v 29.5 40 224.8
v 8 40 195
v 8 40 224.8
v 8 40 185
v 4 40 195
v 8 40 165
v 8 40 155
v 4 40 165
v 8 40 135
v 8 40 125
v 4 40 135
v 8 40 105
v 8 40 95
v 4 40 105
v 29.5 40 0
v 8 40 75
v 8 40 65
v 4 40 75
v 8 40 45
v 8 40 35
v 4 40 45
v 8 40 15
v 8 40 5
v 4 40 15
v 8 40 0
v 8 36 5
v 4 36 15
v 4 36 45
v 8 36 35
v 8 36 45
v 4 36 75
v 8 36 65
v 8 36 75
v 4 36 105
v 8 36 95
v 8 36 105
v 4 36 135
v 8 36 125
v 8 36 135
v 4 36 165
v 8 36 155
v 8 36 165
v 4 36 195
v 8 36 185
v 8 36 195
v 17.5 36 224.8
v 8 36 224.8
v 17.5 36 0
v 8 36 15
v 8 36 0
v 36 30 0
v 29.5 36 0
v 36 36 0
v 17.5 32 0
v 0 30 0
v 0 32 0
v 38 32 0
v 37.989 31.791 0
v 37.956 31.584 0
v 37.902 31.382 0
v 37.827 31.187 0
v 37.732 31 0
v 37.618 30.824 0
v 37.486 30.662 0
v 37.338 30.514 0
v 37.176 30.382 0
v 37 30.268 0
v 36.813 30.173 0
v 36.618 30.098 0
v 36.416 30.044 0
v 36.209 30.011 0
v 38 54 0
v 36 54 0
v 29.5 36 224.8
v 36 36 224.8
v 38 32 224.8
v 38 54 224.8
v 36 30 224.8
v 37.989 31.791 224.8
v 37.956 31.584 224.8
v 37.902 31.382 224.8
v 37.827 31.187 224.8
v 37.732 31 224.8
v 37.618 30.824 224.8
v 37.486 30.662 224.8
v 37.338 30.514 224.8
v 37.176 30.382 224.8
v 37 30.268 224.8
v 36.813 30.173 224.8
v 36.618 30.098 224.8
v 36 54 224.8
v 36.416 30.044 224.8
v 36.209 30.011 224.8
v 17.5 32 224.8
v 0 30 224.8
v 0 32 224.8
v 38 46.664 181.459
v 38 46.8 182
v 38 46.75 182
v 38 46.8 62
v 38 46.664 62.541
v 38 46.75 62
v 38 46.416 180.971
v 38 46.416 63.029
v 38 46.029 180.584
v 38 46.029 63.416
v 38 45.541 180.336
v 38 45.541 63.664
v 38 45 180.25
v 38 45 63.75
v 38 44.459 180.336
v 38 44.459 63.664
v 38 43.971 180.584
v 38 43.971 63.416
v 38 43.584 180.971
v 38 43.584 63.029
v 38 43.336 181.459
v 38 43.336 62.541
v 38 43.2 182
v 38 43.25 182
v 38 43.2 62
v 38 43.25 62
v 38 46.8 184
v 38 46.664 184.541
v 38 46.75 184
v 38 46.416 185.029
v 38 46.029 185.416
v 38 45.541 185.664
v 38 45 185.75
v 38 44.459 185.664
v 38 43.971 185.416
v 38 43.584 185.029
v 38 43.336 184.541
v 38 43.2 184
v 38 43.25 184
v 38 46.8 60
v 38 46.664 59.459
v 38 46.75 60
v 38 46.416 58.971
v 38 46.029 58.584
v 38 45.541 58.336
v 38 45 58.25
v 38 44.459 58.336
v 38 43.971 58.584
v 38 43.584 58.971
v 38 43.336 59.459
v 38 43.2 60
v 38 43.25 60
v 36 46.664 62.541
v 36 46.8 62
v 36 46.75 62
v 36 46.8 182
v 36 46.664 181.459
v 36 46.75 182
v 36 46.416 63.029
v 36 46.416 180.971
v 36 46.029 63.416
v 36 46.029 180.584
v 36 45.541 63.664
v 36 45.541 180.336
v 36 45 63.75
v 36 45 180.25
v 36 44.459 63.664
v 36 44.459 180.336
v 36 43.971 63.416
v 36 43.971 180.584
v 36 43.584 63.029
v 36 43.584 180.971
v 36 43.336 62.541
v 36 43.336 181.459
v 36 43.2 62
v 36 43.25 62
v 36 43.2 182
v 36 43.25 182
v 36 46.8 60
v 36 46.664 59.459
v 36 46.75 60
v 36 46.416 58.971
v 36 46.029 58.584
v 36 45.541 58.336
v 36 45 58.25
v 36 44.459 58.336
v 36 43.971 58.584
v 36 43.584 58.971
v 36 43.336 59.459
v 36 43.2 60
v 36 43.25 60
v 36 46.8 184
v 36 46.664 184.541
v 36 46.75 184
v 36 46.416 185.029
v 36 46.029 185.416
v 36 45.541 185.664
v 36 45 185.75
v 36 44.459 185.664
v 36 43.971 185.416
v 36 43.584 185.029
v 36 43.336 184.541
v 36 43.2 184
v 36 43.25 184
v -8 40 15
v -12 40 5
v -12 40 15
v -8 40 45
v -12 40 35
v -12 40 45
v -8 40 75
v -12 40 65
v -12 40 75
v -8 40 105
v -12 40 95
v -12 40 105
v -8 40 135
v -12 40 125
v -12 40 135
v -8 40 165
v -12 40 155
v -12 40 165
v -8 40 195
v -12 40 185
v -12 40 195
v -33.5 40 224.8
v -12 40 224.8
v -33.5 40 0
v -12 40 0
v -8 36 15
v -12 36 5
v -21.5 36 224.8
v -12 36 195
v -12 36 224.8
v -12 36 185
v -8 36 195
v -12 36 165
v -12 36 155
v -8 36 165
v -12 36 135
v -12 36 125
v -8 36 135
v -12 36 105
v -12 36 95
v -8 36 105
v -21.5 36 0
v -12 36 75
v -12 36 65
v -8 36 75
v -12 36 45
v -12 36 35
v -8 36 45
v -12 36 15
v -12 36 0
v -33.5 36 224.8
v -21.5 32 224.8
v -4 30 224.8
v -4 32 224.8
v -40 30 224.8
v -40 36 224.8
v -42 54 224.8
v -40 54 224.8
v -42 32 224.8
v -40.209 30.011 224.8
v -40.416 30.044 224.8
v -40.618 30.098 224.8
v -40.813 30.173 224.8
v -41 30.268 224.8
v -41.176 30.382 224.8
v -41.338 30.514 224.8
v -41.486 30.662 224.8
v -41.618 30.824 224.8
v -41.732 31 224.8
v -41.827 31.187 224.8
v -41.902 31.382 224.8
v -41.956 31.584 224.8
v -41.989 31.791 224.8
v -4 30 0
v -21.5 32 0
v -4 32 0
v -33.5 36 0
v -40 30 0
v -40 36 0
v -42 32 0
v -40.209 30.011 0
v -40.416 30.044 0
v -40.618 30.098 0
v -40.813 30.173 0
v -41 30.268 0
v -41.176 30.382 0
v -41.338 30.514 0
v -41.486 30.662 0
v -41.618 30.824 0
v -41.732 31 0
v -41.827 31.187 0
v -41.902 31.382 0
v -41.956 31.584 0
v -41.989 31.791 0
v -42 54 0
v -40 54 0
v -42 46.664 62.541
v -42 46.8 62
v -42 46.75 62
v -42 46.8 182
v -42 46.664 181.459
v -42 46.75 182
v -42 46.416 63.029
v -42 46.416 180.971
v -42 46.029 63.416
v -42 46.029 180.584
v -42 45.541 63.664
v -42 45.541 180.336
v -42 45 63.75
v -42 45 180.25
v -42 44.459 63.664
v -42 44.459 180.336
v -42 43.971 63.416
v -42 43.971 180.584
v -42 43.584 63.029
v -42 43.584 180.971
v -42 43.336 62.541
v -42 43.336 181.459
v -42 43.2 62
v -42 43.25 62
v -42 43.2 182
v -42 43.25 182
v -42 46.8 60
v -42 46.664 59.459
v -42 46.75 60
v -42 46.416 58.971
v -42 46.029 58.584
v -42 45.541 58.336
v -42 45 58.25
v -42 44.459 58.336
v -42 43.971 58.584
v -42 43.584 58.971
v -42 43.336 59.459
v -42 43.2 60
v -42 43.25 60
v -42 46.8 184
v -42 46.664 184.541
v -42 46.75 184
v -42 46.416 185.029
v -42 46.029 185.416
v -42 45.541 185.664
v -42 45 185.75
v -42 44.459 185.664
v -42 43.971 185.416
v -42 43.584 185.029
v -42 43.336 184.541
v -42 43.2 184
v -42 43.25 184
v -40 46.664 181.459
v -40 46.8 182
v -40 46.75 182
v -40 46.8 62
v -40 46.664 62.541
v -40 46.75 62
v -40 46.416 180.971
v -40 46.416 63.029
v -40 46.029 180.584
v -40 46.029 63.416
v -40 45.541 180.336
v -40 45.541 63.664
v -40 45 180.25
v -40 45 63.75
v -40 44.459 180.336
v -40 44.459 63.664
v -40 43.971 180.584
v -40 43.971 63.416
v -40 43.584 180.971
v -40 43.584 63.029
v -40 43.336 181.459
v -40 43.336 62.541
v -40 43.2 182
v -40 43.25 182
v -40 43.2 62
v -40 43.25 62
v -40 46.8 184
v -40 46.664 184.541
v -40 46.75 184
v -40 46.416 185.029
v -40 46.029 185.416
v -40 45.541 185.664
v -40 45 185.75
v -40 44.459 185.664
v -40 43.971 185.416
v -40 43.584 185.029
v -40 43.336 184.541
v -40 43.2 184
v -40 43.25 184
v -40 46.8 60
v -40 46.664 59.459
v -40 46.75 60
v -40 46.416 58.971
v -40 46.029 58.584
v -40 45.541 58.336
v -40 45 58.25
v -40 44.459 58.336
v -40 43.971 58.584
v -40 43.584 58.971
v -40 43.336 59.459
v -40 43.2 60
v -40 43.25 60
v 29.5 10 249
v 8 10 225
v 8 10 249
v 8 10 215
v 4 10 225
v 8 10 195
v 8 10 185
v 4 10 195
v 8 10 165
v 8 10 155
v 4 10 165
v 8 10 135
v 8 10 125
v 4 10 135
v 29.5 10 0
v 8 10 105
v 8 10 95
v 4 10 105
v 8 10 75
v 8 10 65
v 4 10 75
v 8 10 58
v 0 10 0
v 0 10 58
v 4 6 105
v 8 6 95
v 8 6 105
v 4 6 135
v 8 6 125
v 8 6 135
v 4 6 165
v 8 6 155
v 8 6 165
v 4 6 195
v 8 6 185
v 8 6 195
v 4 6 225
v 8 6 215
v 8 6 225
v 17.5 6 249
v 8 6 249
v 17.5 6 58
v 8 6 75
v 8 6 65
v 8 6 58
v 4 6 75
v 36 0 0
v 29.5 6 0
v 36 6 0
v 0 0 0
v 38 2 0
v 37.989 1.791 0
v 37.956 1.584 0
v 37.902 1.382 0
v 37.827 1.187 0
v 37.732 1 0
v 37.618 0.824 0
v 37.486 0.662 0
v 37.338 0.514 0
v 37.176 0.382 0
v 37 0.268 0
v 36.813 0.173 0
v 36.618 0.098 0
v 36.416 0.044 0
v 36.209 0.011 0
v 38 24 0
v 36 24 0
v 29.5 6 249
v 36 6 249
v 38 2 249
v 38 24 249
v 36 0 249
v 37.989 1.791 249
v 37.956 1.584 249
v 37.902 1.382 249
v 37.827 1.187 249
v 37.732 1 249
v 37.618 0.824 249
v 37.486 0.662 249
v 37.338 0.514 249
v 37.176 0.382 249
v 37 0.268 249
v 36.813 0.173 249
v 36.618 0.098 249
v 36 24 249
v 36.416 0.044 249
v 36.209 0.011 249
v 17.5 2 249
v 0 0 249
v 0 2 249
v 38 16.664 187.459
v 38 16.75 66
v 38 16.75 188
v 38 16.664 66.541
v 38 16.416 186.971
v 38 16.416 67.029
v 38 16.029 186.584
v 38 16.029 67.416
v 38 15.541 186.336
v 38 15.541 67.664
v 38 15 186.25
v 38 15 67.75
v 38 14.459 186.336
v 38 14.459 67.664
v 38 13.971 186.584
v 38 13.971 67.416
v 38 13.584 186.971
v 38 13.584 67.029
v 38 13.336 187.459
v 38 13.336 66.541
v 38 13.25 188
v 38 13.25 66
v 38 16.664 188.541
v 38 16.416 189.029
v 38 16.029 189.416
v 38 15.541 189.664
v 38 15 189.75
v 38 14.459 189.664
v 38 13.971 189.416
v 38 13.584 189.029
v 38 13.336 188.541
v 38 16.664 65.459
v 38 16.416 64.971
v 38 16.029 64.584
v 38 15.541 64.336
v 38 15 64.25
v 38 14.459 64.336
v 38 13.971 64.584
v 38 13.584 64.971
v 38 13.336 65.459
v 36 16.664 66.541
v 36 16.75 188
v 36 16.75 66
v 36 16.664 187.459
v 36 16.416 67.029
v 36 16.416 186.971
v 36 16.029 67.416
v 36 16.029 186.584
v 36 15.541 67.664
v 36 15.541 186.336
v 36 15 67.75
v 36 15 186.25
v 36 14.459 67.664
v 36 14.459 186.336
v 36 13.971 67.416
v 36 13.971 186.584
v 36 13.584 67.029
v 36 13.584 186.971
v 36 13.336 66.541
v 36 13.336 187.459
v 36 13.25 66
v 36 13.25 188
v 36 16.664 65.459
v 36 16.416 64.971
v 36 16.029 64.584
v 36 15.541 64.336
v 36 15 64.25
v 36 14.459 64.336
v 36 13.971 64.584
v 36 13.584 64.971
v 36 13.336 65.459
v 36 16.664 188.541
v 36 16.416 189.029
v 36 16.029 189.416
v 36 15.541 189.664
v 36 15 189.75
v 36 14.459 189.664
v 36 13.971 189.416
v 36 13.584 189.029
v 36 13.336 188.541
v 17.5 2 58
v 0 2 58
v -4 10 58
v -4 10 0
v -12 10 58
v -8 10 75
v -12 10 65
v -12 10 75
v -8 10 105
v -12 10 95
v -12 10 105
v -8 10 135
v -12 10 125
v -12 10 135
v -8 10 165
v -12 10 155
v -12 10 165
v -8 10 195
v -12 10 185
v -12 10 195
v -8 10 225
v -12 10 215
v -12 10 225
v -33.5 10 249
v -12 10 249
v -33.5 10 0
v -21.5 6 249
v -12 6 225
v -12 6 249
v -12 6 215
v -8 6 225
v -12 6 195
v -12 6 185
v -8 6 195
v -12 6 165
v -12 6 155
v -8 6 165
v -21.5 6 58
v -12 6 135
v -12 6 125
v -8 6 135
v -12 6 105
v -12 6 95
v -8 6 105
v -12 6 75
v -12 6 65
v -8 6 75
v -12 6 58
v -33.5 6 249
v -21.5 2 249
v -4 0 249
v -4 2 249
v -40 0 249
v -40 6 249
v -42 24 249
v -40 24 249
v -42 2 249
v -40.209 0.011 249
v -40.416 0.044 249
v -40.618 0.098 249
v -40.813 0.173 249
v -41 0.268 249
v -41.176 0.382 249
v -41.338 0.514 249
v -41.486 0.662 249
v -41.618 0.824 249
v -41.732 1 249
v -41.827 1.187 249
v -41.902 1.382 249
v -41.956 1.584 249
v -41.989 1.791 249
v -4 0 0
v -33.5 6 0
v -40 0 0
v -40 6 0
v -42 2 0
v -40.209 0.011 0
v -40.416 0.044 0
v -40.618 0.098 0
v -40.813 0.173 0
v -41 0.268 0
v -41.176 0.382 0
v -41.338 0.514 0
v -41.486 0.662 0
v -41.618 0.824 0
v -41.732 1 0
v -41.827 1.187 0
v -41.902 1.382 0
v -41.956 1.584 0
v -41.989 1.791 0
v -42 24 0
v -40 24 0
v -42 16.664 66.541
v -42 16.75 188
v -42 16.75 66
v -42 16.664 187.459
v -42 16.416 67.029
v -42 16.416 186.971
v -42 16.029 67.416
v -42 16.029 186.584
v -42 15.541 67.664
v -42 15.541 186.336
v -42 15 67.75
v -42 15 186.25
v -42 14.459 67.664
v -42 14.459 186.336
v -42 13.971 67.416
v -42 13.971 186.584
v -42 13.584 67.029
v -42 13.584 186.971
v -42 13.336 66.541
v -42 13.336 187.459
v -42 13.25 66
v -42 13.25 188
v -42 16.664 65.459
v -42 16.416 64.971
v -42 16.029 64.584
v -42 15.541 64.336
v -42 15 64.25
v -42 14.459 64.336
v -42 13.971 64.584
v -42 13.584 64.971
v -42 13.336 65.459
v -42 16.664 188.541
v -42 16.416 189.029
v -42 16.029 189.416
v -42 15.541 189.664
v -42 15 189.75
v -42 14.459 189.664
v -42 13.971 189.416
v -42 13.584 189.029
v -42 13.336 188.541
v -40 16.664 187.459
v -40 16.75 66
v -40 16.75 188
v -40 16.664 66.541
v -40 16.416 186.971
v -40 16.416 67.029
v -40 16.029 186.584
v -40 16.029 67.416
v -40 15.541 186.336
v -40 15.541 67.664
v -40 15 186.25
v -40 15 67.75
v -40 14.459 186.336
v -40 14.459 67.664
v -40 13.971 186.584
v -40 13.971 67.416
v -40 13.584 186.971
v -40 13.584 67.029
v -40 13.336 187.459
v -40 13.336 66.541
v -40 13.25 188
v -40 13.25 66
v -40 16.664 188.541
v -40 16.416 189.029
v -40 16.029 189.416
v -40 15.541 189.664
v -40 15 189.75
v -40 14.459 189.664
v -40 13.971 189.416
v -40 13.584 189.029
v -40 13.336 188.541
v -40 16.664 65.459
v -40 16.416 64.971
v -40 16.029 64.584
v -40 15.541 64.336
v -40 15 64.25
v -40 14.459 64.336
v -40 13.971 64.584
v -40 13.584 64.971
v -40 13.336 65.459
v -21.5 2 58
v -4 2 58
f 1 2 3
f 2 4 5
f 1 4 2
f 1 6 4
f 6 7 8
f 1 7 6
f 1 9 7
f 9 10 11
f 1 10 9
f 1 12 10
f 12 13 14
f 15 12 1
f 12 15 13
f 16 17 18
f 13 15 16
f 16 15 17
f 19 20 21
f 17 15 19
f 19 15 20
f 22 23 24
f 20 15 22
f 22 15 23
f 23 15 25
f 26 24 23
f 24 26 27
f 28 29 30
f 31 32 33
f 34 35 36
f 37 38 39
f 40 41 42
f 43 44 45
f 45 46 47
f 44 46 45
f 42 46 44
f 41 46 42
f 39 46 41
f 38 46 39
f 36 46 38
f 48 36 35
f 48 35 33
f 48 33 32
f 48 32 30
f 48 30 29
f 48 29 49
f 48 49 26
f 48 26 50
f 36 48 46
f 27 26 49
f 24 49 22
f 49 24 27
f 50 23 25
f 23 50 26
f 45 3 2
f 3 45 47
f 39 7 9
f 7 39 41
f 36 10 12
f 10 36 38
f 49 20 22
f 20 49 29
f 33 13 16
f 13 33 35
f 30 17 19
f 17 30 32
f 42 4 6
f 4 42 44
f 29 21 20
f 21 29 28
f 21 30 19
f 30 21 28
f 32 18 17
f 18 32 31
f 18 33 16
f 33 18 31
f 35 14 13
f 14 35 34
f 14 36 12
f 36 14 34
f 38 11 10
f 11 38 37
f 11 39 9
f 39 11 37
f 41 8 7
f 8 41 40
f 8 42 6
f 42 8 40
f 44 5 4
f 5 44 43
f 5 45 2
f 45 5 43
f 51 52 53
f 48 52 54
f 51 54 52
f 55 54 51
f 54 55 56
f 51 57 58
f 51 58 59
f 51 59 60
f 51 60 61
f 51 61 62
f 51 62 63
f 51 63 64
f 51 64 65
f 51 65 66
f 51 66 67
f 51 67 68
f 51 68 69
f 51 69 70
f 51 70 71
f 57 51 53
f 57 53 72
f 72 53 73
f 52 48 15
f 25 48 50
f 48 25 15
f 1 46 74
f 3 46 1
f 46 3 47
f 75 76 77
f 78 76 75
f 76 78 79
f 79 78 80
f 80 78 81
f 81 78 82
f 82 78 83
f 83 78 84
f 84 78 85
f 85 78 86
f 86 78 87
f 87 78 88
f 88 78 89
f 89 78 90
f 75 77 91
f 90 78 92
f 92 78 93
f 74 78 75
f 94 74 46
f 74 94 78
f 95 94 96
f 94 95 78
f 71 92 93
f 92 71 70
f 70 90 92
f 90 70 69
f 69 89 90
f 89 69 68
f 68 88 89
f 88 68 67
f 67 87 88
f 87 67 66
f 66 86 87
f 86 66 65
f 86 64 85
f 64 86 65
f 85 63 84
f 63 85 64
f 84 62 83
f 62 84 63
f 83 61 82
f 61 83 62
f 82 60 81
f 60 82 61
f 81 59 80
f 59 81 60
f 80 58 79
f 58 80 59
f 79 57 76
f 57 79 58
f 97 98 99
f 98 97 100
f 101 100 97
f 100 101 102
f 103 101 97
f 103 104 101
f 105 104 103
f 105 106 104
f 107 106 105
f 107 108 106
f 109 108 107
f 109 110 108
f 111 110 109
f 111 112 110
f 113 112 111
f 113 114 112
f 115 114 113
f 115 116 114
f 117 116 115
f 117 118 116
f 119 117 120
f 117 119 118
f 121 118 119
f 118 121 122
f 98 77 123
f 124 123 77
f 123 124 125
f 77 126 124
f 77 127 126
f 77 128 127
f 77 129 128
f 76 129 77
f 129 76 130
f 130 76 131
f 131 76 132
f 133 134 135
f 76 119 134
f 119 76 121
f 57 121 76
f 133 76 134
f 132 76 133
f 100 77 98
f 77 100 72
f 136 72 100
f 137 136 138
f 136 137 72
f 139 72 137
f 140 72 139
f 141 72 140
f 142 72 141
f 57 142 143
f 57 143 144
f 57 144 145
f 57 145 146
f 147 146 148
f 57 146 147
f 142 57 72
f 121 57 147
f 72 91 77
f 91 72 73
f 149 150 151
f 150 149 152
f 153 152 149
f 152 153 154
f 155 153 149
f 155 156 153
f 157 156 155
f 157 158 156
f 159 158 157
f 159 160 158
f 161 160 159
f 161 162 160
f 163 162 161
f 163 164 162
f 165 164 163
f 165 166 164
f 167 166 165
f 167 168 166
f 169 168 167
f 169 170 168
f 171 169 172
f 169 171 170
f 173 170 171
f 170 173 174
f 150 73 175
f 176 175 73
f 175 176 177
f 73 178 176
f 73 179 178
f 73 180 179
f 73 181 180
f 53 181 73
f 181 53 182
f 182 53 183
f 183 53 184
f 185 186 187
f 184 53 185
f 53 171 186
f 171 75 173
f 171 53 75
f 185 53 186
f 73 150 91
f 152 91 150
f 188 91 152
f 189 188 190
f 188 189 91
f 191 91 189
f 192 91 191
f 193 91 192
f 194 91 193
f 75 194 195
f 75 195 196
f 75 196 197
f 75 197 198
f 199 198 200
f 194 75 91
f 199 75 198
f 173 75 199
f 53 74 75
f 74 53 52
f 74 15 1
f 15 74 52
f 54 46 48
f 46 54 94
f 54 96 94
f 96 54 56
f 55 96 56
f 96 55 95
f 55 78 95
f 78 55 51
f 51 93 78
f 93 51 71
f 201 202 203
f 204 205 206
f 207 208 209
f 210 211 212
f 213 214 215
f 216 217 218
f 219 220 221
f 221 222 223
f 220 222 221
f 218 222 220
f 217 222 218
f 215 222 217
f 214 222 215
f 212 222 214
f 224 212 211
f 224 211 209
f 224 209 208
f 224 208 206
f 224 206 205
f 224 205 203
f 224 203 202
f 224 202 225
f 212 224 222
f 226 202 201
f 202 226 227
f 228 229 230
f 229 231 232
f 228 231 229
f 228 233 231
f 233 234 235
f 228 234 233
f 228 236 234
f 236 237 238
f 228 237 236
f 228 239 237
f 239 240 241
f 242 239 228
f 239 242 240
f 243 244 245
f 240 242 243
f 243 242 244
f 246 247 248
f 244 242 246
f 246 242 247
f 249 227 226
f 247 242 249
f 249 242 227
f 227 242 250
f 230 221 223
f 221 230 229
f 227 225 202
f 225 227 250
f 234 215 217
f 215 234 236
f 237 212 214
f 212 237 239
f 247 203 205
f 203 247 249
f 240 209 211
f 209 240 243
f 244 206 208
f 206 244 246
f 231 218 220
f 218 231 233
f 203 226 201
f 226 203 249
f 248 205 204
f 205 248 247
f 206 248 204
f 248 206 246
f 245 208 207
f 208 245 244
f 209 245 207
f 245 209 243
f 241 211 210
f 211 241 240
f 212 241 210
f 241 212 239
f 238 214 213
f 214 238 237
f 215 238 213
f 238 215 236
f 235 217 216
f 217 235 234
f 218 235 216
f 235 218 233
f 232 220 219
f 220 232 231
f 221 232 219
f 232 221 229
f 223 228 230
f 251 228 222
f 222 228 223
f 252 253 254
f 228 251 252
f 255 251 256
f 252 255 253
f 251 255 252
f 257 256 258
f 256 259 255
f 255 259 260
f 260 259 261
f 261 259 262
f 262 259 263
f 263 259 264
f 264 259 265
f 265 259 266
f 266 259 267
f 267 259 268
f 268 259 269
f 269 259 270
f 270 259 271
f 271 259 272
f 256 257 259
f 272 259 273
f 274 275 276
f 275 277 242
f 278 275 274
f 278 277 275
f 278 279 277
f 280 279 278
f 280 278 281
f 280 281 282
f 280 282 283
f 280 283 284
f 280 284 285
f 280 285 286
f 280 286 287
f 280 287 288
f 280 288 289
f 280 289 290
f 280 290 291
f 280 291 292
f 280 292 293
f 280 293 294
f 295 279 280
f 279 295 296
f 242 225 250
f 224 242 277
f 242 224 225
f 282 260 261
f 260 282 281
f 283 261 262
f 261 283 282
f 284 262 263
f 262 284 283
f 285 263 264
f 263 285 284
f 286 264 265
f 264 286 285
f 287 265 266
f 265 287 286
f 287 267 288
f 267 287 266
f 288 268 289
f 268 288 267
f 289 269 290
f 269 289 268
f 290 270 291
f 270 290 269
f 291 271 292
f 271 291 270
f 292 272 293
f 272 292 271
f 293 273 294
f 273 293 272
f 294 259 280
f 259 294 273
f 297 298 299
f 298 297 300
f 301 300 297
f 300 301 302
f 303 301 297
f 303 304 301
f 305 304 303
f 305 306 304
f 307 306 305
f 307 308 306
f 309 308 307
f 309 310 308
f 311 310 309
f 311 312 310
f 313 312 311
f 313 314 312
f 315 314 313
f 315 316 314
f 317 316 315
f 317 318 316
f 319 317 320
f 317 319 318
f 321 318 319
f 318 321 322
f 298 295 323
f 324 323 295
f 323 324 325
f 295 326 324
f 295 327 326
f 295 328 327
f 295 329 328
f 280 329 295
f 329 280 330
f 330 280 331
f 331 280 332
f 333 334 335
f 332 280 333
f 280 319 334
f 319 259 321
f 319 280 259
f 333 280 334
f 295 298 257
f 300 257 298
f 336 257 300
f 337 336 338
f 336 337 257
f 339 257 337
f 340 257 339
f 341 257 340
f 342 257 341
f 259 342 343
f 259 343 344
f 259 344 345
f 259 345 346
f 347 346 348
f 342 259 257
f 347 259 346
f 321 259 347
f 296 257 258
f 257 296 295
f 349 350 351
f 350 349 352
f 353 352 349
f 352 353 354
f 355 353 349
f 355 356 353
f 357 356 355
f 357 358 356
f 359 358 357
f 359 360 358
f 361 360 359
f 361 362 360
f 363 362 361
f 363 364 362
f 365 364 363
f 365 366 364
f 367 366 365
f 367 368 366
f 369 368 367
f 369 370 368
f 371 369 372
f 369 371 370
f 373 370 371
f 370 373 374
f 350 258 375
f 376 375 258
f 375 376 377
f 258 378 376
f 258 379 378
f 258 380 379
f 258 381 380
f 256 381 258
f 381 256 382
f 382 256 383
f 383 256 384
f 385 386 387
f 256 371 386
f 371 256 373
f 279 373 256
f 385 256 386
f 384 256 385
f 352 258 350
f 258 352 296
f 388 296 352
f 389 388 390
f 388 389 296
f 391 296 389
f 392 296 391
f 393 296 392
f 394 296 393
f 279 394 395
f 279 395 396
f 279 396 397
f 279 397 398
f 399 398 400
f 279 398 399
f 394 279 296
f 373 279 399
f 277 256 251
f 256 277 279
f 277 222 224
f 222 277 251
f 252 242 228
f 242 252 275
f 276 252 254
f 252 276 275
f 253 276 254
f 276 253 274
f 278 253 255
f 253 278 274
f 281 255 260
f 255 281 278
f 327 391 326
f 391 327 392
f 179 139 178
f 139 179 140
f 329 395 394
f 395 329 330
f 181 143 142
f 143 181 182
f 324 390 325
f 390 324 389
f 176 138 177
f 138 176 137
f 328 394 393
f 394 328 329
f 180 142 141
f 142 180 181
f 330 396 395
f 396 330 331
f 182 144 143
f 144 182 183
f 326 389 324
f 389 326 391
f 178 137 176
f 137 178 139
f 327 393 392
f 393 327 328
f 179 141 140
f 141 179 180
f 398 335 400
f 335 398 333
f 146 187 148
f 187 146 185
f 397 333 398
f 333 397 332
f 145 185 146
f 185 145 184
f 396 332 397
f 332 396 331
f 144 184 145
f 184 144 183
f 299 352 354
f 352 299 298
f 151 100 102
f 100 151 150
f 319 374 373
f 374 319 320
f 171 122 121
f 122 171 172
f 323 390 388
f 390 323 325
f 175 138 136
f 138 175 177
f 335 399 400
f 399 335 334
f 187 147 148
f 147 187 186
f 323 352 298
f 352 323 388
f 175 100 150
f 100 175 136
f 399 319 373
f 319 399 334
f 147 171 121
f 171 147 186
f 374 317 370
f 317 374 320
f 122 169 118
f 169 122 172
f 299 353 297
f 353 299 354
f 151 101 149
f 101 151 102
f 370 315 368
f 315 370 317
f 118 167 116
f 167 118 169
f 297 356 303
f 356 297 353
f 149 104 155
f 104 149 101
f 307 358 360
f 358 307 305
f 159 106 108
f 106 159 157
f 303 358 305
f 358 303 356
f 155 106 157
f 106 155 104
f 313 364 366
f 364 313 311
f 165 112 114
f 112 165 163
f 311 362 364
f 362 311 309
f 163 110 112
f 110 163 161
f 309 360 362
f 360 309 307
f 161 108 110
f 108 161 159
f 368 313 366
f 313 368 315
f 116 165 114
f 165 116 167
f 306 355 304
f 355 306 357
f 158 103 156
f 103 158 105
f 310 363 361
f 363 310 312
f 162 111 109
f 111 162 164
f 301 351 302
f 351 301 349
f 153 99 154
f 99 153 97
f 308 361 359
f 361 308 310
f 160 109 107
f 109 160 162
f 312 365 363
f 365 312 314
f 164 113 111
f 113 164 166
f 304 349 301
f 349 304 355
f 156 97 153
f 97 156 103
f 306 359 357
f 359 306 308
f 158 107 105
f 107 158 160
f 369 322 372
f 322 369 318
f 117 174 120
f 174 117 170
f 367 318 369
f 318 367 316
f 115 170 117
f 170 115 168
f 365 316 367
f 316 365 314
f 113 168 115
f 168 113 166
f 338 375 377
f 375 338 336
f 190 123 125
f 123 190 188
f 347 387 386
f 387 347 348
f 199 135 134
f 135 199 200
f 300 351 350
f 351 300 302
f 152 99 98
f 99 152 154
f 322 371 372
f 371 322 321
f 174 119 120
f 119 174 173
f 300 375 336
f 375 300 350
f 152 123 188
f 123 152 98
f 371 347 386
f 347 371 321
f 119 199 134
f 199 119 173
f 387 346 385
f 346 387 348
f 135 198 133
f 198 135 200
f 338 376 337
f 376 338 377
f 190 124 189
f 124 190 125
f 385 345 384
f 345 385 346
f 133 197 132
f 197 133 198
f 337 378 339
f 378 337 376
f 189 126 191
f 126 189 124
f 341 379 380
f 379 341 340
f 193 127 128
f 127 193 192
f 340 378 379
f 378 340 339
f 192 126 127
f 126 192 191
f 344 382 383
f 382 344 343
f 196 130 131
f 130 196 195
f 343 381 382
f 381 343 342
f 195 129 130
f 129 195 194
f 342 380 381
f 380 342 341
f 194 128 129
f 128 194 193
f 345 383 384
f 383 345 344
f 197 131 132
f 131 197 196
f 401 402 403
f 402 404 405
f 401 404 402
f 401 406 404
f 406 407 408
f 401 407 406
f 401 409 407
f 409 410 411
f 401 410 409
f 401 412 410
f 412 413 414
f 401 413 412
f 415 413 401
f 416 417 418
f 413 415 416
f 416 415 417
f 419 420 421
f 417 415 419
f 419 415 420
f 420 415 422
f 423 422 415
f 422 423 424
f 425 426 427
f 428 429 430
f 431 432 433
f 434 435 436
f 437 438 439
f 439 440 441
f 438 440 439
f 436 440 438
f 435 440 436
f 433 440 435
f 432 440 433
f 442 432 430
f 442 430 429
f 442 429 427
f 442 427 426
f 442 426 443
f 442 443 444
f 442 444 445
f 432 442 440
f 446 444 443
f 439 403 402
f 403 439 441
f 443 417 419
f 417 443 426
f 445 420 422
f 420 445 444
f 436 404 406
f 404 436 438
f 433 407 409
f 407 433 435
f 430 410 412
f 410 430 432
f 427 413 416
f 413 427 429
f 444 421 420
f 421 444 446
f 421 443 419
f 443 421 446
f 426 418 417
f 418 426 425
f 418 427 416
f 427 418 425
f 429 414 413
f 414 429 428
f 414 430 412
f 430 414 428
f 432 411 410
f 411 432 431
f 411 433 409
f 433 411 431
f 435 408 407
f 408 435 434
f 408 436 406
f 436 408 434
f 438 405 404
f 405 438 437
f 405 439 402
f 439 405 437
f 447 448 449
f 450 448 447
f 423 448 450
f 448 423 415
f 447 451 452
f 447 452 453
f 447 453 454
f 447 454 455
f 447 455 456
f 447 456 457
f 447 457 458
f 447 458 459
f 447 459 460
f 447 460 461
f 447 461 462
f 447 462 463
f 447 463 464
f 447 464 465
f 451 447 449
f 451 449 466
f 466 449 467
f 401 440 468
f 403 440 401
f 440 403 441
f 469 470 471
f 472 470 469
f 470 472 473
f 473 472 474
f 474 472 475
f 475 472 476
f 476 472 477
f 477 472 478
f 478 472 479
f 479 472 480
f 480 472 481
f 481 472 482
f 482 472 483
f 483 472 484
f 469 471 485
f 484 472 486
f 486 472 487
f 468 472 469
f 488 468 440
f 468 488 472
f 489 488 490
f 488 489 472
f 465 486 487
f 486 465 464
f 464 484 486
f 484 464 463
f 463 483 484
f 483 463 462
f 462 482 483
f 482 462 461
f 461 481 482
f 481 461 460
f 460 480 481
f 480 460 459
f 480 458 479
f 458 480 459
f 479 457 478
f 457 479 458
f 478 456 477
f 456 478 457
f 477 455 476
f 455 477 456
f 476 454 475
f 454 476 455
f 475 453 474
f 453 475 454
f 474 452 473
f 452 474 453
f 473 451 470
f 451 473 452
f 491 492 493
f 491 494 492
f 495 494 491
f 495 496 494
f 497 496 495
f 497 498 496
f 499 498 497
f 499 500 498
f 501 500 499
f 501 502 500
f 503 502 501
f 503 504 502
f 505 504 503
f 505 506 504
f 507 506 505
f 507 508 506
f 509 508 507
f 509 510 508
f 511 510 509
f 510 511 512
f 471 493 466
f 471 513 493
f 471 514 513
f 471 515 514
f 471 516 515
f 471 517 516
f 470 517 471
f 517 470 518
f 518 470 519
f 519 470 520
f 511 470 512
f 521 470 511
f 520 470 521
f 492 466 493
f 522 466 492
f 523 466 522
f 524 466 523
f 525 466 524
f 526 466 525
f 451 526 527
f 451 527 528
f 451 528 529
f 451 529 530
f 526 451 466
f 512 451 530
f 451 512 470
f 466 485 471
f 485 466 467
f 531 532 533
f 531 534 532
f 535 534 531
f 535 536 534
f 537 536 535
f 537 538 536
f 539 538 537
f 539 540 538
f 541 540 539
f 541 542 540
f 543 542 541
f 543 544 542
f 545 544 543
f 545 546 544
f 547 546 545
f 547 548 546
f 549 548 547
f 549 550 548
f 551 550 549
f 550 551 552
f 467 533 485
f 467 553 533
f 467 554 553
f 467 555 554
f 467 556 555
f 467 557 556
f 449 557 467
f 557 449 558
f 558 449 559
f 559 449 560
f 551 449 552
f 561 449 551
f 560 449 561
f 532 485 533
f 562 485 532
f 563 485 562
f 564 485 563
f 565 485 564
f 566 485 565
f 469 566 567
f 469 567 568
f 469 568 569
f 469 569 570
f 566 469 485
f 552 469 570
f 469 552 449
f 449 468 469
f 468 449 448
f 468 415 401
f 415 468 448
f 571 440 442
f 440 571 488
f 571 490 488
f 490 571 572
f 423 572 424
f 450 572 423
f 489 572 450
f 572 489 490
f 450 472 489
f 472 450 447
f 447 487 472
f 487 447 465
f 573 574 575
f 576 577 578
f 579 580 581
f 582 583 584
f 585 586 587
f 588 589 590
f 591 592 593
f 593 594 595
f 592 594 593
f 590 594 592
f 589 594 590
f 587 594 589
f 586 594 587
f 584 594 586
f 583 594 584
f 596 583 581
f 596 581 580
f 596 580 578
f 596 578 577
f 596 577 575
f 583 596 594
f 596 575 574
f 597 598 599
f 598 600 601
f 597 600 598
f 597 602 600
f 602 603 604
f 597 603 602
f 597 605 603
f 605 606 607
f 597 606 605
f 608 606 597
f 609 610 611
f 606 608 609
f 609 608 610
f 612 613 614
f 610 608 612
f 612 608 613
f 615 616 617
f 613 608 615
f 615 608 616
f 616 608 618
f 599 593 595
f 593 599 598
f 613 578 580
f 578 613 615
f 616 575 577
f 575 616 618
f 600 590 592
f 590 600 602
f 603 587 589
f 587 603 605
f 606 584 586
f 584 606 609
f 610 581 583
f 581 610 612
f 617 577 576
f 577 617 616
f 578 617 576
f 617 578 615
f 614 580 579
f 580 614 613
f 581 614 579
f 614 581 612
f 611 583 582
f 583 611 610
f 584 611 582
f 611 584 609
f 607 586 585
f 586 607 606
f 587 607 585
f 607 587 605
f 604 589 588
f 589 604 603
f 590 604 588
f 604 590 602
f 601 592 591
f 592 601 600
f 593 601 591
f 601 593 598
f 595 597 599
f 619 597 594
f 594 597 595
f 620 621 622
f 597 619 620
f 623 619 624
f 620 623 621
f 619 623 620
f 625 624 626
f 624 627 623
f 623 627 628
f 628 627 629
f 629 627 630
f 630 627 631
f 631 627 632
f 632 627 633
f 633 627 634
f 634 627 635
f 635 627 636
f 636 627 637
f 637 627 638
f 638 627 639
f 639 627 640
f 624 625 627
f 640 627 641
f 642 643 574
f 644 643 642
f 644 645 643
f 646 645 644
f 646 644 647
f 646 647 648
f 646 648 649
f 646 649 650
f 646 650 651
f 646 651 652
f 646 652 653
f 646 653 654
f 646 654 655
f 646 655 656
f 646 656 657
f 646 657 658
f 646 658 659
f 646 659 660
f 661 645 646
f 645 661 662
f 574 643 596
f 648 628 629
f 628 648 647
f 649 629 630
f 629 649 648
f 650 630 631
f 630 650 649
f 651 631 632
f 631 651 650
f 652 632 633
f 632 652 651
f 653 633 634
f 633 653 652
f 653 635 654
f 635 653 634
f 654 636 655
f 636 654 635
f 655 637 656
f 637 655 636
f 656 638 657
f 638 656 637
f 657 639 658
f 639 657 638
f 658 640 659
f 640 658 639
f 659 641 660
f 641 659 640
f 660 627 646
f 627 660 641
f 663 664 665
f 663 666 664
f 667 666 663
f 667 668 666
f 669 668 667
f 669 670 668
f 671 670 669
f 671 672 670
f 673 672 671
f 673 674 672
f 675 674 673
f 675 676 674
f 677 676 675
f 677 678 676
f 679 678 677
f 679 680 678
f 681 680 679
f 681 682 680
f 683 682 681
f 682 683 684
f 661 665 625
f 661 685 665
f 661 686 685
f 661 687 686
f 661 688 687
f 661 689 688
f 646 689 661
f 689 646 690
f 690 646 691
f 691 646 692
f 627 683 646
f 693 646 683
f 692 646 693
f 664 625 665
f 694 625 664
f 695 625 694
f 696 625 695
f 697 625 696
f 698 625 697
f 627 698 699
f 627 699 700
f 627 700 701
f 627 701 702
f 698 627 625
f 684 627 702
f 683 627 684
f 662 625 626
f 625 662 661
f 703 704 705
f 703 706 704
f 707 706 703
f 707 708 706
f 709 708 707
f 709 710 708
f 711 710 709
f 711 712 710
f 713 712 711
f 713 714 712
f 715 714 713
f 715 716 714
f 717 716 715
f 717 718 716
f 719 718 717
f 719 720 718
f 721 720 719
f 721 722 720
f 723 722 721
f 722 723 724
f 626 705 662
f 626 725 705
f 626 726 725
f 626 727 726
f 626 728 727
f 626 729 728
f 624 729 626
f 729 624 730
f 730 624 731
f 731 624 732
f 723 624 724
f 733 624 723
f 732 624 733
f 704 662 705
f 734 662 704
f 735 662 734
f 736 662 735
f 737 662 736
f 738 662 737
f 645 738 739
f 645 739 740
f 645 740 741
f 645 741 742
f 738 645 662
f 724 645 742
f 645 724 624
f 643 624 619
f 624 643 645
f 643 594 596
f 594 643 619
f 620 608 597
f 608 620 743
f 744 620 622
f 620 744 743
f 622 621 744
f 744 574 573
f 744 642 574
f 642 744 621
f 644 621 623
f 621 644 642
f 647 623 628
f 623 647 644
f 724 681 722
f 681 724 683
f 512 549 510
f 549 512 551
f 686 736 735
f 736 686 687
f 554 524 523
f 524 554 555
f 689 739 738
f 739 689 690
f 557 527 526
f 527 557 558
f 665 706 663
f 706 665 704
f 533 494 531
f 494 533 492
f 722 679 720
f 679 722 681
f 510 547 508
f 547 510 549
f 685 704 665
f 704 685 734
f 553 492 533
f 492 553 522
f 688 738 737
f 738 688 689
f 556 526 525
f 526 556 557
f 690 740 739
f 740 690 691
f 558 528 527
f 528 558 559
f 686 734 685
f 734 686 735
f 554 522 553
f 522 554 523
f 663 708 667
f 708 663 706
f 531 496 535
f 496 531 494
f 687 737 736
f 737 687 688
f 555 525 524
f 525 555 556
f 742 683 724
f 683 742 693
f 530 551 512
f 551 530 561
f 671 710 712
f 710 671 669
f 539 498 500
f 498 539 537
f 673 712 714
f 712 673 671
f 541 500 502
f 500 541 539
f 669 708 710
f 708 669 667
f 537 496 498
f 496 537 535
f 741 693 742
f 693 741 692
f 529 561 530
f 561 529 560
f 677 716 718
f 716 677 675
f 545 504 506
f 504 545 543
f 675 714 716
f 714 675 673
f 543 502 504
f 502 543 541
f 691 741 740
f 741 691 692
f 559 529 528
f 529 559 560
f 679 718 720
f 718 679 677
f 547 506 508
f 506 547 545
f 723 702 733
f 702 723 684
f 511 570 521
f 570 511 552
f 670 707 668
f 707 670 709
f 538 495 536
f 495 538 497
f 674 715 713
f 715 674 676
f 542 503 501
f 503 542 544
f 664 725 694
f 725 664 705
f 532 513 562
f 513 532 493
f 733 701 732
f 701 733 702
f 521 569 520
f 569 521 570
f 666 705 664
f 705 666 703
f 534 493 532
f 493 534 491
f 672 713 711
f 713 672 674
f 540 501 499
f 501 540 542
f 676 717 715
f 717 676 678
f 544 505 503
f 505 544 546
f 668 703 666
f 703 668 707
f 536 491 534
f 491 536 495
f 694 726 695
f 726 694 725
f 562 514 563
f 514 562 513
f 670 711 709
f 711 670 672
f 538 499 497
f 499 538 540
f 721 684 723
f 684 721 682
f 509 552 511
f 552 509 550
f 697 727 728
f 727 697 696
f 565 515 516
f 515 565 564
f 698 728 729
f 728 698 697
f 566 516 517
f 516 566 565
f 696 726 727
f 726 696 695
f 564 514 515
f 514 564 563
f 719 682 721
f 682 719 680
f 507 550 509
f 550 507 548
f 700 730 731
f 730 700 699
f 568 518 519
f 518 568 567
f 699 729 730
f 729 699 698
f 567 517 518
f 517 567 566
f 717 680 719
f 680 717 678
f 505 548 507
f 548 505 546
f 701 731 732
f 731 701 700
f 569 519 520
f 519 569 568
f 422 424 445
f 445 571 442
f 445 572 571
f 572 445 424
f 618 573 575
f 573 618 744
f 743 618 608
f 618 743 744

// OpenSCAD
/* [Model Generation Selection] */

// Generate sliders for Ultimaker2 Extended or the regular Ultimaker2
extended = true;

// Include the lower runner halves
includeLowerSections = true;

// Include the upper runner halves
includeUpperSections = true; 

// Incldue runners for the left side of the printer
includeLeftSections = true;

// Inlude runners for the right side of the printer
includeRightSections = true;

/* [Knotches] */

// Include knotches on the inside surface to help latch the sliding door.
knotches = true;

// Spacing between knotches
knotchSpacing = 30;

/* [Model Customisation] */

// How high up the base part is filled to stop the door going all the way down. 
filledHeight = 60;
// 60mm gives just above display Actual fill is this - the floor offset

// How much speace to leave between the bottom of the runners and the floor (bottom of the UM)
//floorOffset = 15; //- if you have feet around the corners of the printer.
floorOffset = 2;

// Width of acrylic door. allow a tollerance, e.g. 3mm cast acrylic can be 3.5mm or even 4mm in places.
acrylicWidth = 4;

/* [Testing] */

// Create the test piece only. Useful for checking fit to the UM.
testPiece = false;

/* [Hidden] */

// Visualisation for UM.
ultimakerWidth = 339; 

// UM2 Extended only. 
distanceBetweenHoles = 122;

// Show the Ultimaker, door etc for model checking
includeVisualisation = false;

// Gap between models.
seperationBetweenSides = 0;
// -32 for offset in right bracked.
//seperationBetweenSides = ultimakerWidth - (38*2);
// gives 0 width for ultimaker inbeterrn
 //seperationBetweenSides = -(38*2);

module showUltimakerExtended() {
    // down 2mm as the runners are raised up by 2mm.
    translate([-(ultimakerWidth-38 +2) ,11,-2]) {
        cube([ultimakerWidth,200,490]);
        
        // Show Screws.
        translate([0,5-1,0]) {
            for (zOfffset = [69-1 : distanceBetweenHoles : 480]) {           
                translate([0,0,zOfffset]) {
                    cube([400,2,2]);
                }
            }
        }
    }
}

module showUltimakerRegular() {
    // down 2mm as the runners are raised up by 2mm.
    translate([-(ultimakerWidth-38 +2) ,11,-2]) {
        cube([ultimakerWidth,200,388]);
        
        // Show Screws.
        translate([0,5-1,0]) {
            translate([0,0,69.7]) {
                cube([400,2,2]);
            }
            translate([0,0,69.7 + 131.9]) {
                cube([400,2,2]);
            }
            translate([0,0,69.7 + 131.9 + 134.1]) {
                cube([400,2,2]);
            }    
        }
    }
}

module showDoor() {
xOffset = -(ultimakerWidth-38 +2) + 19;

    translate([xOffset ,2,15 + filledHeight-floorOffset]) {
        % cube([300,acrylicWidth,500]);
    }
}

module bracket(h) {
    linear_extrude(height = h) { 
        //+4 on the x.
        //polygon(points=[[0,0],[34,0],[34,25],[32,25],[32,7],[25.5,7],[25.5,11],[4,11],[4,8],[19,8],[19,2],[0,2], [0,0]]);
        
        difference() {
            union() {
                polygon(points=[[0,0],[36,0],[38,2],[38,20+acrylicWidth],[36,20+acrylicWidth],[36,2+acrylicWidth],[29.5,2+acrylicWidth],[29.5,6+acrylicWidth],[8,6+acrylicWidth],[8,2+acrylicWidth],[17.5,2+acrylicWidth],[17.5,2],[0,2], [0,0]]);
                
                translate([36,2,0]) {
                    // 4.2mm hole allows for a M3 pushfit nut
                    // or small cable/string run inside
                    circle(d=4, $fn=60);
                }
            }
            union() {
                translate([23,4,0]) {
                    // 4.2mm hole allows for a M3 pushfit nut
                    // or small cable/string run inside
                   // circle(d=4.2, $fn=60);
                }
            }
        }
    }
}



// Well, more take them away
module addRightKnotches(h) {
    // start at 15mm as this keeps the underside
    // vent gap in the Ultimaker open
    for (zOffset = [15: knotchSpacing: h]) {
        translate([0,6+acrylicWidth, zOffset]) {
            rotate([0,90,-90]) {
                linear_extrude(height = 4) { 
                    polygon(points=[[0,0],[10,4],[0,4],[0,0]]);
                }
            }
        }
    }
}

module addLeftKnotches(h) {
    // start at 15mm as this keeps the underside
    // vent gap in the Ultimaker open
    for (zOffset = [15: knotchSpacing: h]) {
        translate([-3,6+acrylicWidth, zOffset]) {
            rotate([0,90,-90]) {
                linear_extrude(height = 4) { 
                    polygon(points=[[10,0],[10,0],[0,4],[00,0]]);
                }
            }
        }
    }
}

module rightBracket (h)  {
    bracket(h);
    if (knotches) {
        translate([4,0,0]) {
            addRightKnotches(h);
        }
    }
}

module leftBracket (h)  {
    translate([-4,0,h]) {
        rotate([0,180,0]) {
            bracket(h);
        }
    }
    if (knotches) {
        translate([-9,0,0]) {
            addLeftKnotches(h);
        }
    }
}    

// Used by the lower section as that wants to be in a set place
module screwHole(zPosition, isBase) {
    if (isBase) {
        // Single fixed place hole
        translate([-395,0,zPosition]) {
            rotate([0,90,0]) {
                cylinder(d=3.5, h=600, $fn=20);
            }
        }
    } else {
        longScrewHole(zPosition);
    }
}

// User by the upper position to allow for a little fitting tollerance.
module longScrewHole(zPosition) {   
    // Larger hole for adjustment.
    translate([-395,0,zPosition-1]) {
        rotate([0,90,0]) {
            cylinder(d=3.5, h=600, $fn=20);
        }
    }
    
    // Join the holes.
    translate([-395,-3.6/2,zPosition-(2/2)]) {
        cube([600,3.6,2]);
    }
    
    translate([-395,0,zPosition+1]) {
        rotate([0,90,0]) {
            cylinder(d=3.5, h=600, $fn=20);
        }
    }
}

module main(h, fillBase, holes) {
    // for 2 sections to make a door on extended
    
    echo ("Height = ", h);
    echo ("First Hole At = ", holes[0]);
    
    difference() {
        union() {
            if (includeRightSections) {
                rightBracket(h);            
            }
            
            if (includeLeftSections) {
                translate([-seperationBetweenSides,0,0]) {
                   leftBracket(h);    
                }
            }
        }
        union() {
            
            translate([34-3,11+acrylicWidth,0]) {                
                // holes.
                for (holeZPosition = holes) {
                    screwHole(holeZPosition, fillBase);
                }                
            }
        }
    }   
    
    // fill the bottom(/top) to stop acrylic calling out.
    if (fillBase) {
        if (includeRightSections) {
            cube([20, 6 + acrylicWidth, filledHeight - floorOffset]);
        }
        
        if (includeLeftSections) {
            translate([-seperationBetweenSides-24,0,0]) {
                cube([20, 6 + acrylicWidth, filledHeight - floorOffset]);
            }
        }
    }
}



// Help visualise if we have the screwholes in the correct place.
module lowerSectionMarker() {
    translate([30,10,0]) {
        // first hole
        cube([10,10,70]);
        // second hole
        translate([0,10,0]) cube([10,10,70+122]);
        // top
        translate([0,20,0]) cube([10,10,70+122+61]);
    }
}

module upperSectionMarker() {
    translate([30,10,0]) {
        // first hole
        cube([10,10,61]);
        // second hole
        translate([0,10,0]) cube([10,10,61+122]);
        // top
        translate([0,20,0]) cube([10,10,61+122+61]);
    }
}

// ==============================================
// UM2 Extended runners.
// ==============================================
module extendedUpperDoorRunners() {
    // Set-up so that 2 pieced
    // can be stacked on top of each other
    
    // For upper parts.
    lowerPartHeight = (distanceBetweenHoles/2); // 122/2 == 61mm.
    
    // 28mm lower in height to so they don't jut over the top.
    // + 7.8mm takes the part to the top of the UME
    height = lowerPartHeight + (distanceBetweenHoles) + (distanceBetweenHoles/2) - 27 + 7.8; 
    
    holes = [lowerPartHeight, lowerPartHeight + distanceBetweenHoles];
    
    main(height, false, holes);
}

module extendedLowerDoorRunners() {
    // For base parts
    // actual first hole at 70mm
    // leaves 2mm gap on floor
    lowerPartHeight = 68; 
    
    height = lowerPartHeight + (distanceBetweenHoles) + (distanceBetweenHoles/2)-  floorOffset; 
    
    holes = [lowerPartHeight -  floorOffset, lowerPartHeight + distanceBetweenHoles-  floorOffset];
    
    main(height, true, holes);
}

module extendedDoorRunners() {
    // Set-up so that 2 pieced
    // can be stacked on top of each other
    if (includeUpperSections) {
        // For Printing
        translate([0,30,0]) {
        // For Visualisation
        //translate([0,0,68 + 122 + 61 + 0.5-floorOffset]) {
            extendedUpperDoorRunners();
        }
    }
        
    if (includeLowerSections) {
        extendedLowerDoorRunners();
    }
}

// ==============================================
// Regular UM2 runners.
// ==============================================
module regularDoorRunners() {
    
// Overall height 388mm
// Holes:
// 69.7 + 131.9 + 134.1 = 335.7
// 69.7 + 131.9 = 201.6
// 69.7
    
// Need to take off any offset
splitPoint = 69.7 + 131.9;       
   
    // Upper section
    if (includeUpperSections) {
        // For Printing
        translate([0,30,0]) {
        // For Visualisation
        //translate([0,0,splitPoint-floorOffset]) {
            // UM full height - 20mm offset at top
            height = 388 - 20 - splitPoint;
            holes = [0, 134.1];
            main(height, false, holes);
        }
    }
  
    // Lower section
    if (includeLowerSections) {
        // Joint is in the middle of the second screw.
        height = splitPoint - floorOffset; 
        
        // z positions for holes.
        holes = [69.7 - floorOffset, 201.6 - floorOffset];
        main(height, true, holes);
    }
}


// Application flow...

if (testPiece) {
    // Print test pieces for fit.
    main(10, 5, false);
} else {

    if (extended) {
        extendedDoorRunners();
    } else {
        regularDoorRunners();
    }

    if (includeVisualisation) {

        // Visualisation
        translate([0,0,-floorOffset]) {
            if (extended) {
                %showUltimakerExtended();
            } else {
                %showUltimakerRegular();
            }
            %showDoor();

            translate([0,0,251.5]) {
                %upperSectionMarker();
            }

            translate([0,0,-2]) {
                %lowerSectionMarker();
            }
        }
    }
}
